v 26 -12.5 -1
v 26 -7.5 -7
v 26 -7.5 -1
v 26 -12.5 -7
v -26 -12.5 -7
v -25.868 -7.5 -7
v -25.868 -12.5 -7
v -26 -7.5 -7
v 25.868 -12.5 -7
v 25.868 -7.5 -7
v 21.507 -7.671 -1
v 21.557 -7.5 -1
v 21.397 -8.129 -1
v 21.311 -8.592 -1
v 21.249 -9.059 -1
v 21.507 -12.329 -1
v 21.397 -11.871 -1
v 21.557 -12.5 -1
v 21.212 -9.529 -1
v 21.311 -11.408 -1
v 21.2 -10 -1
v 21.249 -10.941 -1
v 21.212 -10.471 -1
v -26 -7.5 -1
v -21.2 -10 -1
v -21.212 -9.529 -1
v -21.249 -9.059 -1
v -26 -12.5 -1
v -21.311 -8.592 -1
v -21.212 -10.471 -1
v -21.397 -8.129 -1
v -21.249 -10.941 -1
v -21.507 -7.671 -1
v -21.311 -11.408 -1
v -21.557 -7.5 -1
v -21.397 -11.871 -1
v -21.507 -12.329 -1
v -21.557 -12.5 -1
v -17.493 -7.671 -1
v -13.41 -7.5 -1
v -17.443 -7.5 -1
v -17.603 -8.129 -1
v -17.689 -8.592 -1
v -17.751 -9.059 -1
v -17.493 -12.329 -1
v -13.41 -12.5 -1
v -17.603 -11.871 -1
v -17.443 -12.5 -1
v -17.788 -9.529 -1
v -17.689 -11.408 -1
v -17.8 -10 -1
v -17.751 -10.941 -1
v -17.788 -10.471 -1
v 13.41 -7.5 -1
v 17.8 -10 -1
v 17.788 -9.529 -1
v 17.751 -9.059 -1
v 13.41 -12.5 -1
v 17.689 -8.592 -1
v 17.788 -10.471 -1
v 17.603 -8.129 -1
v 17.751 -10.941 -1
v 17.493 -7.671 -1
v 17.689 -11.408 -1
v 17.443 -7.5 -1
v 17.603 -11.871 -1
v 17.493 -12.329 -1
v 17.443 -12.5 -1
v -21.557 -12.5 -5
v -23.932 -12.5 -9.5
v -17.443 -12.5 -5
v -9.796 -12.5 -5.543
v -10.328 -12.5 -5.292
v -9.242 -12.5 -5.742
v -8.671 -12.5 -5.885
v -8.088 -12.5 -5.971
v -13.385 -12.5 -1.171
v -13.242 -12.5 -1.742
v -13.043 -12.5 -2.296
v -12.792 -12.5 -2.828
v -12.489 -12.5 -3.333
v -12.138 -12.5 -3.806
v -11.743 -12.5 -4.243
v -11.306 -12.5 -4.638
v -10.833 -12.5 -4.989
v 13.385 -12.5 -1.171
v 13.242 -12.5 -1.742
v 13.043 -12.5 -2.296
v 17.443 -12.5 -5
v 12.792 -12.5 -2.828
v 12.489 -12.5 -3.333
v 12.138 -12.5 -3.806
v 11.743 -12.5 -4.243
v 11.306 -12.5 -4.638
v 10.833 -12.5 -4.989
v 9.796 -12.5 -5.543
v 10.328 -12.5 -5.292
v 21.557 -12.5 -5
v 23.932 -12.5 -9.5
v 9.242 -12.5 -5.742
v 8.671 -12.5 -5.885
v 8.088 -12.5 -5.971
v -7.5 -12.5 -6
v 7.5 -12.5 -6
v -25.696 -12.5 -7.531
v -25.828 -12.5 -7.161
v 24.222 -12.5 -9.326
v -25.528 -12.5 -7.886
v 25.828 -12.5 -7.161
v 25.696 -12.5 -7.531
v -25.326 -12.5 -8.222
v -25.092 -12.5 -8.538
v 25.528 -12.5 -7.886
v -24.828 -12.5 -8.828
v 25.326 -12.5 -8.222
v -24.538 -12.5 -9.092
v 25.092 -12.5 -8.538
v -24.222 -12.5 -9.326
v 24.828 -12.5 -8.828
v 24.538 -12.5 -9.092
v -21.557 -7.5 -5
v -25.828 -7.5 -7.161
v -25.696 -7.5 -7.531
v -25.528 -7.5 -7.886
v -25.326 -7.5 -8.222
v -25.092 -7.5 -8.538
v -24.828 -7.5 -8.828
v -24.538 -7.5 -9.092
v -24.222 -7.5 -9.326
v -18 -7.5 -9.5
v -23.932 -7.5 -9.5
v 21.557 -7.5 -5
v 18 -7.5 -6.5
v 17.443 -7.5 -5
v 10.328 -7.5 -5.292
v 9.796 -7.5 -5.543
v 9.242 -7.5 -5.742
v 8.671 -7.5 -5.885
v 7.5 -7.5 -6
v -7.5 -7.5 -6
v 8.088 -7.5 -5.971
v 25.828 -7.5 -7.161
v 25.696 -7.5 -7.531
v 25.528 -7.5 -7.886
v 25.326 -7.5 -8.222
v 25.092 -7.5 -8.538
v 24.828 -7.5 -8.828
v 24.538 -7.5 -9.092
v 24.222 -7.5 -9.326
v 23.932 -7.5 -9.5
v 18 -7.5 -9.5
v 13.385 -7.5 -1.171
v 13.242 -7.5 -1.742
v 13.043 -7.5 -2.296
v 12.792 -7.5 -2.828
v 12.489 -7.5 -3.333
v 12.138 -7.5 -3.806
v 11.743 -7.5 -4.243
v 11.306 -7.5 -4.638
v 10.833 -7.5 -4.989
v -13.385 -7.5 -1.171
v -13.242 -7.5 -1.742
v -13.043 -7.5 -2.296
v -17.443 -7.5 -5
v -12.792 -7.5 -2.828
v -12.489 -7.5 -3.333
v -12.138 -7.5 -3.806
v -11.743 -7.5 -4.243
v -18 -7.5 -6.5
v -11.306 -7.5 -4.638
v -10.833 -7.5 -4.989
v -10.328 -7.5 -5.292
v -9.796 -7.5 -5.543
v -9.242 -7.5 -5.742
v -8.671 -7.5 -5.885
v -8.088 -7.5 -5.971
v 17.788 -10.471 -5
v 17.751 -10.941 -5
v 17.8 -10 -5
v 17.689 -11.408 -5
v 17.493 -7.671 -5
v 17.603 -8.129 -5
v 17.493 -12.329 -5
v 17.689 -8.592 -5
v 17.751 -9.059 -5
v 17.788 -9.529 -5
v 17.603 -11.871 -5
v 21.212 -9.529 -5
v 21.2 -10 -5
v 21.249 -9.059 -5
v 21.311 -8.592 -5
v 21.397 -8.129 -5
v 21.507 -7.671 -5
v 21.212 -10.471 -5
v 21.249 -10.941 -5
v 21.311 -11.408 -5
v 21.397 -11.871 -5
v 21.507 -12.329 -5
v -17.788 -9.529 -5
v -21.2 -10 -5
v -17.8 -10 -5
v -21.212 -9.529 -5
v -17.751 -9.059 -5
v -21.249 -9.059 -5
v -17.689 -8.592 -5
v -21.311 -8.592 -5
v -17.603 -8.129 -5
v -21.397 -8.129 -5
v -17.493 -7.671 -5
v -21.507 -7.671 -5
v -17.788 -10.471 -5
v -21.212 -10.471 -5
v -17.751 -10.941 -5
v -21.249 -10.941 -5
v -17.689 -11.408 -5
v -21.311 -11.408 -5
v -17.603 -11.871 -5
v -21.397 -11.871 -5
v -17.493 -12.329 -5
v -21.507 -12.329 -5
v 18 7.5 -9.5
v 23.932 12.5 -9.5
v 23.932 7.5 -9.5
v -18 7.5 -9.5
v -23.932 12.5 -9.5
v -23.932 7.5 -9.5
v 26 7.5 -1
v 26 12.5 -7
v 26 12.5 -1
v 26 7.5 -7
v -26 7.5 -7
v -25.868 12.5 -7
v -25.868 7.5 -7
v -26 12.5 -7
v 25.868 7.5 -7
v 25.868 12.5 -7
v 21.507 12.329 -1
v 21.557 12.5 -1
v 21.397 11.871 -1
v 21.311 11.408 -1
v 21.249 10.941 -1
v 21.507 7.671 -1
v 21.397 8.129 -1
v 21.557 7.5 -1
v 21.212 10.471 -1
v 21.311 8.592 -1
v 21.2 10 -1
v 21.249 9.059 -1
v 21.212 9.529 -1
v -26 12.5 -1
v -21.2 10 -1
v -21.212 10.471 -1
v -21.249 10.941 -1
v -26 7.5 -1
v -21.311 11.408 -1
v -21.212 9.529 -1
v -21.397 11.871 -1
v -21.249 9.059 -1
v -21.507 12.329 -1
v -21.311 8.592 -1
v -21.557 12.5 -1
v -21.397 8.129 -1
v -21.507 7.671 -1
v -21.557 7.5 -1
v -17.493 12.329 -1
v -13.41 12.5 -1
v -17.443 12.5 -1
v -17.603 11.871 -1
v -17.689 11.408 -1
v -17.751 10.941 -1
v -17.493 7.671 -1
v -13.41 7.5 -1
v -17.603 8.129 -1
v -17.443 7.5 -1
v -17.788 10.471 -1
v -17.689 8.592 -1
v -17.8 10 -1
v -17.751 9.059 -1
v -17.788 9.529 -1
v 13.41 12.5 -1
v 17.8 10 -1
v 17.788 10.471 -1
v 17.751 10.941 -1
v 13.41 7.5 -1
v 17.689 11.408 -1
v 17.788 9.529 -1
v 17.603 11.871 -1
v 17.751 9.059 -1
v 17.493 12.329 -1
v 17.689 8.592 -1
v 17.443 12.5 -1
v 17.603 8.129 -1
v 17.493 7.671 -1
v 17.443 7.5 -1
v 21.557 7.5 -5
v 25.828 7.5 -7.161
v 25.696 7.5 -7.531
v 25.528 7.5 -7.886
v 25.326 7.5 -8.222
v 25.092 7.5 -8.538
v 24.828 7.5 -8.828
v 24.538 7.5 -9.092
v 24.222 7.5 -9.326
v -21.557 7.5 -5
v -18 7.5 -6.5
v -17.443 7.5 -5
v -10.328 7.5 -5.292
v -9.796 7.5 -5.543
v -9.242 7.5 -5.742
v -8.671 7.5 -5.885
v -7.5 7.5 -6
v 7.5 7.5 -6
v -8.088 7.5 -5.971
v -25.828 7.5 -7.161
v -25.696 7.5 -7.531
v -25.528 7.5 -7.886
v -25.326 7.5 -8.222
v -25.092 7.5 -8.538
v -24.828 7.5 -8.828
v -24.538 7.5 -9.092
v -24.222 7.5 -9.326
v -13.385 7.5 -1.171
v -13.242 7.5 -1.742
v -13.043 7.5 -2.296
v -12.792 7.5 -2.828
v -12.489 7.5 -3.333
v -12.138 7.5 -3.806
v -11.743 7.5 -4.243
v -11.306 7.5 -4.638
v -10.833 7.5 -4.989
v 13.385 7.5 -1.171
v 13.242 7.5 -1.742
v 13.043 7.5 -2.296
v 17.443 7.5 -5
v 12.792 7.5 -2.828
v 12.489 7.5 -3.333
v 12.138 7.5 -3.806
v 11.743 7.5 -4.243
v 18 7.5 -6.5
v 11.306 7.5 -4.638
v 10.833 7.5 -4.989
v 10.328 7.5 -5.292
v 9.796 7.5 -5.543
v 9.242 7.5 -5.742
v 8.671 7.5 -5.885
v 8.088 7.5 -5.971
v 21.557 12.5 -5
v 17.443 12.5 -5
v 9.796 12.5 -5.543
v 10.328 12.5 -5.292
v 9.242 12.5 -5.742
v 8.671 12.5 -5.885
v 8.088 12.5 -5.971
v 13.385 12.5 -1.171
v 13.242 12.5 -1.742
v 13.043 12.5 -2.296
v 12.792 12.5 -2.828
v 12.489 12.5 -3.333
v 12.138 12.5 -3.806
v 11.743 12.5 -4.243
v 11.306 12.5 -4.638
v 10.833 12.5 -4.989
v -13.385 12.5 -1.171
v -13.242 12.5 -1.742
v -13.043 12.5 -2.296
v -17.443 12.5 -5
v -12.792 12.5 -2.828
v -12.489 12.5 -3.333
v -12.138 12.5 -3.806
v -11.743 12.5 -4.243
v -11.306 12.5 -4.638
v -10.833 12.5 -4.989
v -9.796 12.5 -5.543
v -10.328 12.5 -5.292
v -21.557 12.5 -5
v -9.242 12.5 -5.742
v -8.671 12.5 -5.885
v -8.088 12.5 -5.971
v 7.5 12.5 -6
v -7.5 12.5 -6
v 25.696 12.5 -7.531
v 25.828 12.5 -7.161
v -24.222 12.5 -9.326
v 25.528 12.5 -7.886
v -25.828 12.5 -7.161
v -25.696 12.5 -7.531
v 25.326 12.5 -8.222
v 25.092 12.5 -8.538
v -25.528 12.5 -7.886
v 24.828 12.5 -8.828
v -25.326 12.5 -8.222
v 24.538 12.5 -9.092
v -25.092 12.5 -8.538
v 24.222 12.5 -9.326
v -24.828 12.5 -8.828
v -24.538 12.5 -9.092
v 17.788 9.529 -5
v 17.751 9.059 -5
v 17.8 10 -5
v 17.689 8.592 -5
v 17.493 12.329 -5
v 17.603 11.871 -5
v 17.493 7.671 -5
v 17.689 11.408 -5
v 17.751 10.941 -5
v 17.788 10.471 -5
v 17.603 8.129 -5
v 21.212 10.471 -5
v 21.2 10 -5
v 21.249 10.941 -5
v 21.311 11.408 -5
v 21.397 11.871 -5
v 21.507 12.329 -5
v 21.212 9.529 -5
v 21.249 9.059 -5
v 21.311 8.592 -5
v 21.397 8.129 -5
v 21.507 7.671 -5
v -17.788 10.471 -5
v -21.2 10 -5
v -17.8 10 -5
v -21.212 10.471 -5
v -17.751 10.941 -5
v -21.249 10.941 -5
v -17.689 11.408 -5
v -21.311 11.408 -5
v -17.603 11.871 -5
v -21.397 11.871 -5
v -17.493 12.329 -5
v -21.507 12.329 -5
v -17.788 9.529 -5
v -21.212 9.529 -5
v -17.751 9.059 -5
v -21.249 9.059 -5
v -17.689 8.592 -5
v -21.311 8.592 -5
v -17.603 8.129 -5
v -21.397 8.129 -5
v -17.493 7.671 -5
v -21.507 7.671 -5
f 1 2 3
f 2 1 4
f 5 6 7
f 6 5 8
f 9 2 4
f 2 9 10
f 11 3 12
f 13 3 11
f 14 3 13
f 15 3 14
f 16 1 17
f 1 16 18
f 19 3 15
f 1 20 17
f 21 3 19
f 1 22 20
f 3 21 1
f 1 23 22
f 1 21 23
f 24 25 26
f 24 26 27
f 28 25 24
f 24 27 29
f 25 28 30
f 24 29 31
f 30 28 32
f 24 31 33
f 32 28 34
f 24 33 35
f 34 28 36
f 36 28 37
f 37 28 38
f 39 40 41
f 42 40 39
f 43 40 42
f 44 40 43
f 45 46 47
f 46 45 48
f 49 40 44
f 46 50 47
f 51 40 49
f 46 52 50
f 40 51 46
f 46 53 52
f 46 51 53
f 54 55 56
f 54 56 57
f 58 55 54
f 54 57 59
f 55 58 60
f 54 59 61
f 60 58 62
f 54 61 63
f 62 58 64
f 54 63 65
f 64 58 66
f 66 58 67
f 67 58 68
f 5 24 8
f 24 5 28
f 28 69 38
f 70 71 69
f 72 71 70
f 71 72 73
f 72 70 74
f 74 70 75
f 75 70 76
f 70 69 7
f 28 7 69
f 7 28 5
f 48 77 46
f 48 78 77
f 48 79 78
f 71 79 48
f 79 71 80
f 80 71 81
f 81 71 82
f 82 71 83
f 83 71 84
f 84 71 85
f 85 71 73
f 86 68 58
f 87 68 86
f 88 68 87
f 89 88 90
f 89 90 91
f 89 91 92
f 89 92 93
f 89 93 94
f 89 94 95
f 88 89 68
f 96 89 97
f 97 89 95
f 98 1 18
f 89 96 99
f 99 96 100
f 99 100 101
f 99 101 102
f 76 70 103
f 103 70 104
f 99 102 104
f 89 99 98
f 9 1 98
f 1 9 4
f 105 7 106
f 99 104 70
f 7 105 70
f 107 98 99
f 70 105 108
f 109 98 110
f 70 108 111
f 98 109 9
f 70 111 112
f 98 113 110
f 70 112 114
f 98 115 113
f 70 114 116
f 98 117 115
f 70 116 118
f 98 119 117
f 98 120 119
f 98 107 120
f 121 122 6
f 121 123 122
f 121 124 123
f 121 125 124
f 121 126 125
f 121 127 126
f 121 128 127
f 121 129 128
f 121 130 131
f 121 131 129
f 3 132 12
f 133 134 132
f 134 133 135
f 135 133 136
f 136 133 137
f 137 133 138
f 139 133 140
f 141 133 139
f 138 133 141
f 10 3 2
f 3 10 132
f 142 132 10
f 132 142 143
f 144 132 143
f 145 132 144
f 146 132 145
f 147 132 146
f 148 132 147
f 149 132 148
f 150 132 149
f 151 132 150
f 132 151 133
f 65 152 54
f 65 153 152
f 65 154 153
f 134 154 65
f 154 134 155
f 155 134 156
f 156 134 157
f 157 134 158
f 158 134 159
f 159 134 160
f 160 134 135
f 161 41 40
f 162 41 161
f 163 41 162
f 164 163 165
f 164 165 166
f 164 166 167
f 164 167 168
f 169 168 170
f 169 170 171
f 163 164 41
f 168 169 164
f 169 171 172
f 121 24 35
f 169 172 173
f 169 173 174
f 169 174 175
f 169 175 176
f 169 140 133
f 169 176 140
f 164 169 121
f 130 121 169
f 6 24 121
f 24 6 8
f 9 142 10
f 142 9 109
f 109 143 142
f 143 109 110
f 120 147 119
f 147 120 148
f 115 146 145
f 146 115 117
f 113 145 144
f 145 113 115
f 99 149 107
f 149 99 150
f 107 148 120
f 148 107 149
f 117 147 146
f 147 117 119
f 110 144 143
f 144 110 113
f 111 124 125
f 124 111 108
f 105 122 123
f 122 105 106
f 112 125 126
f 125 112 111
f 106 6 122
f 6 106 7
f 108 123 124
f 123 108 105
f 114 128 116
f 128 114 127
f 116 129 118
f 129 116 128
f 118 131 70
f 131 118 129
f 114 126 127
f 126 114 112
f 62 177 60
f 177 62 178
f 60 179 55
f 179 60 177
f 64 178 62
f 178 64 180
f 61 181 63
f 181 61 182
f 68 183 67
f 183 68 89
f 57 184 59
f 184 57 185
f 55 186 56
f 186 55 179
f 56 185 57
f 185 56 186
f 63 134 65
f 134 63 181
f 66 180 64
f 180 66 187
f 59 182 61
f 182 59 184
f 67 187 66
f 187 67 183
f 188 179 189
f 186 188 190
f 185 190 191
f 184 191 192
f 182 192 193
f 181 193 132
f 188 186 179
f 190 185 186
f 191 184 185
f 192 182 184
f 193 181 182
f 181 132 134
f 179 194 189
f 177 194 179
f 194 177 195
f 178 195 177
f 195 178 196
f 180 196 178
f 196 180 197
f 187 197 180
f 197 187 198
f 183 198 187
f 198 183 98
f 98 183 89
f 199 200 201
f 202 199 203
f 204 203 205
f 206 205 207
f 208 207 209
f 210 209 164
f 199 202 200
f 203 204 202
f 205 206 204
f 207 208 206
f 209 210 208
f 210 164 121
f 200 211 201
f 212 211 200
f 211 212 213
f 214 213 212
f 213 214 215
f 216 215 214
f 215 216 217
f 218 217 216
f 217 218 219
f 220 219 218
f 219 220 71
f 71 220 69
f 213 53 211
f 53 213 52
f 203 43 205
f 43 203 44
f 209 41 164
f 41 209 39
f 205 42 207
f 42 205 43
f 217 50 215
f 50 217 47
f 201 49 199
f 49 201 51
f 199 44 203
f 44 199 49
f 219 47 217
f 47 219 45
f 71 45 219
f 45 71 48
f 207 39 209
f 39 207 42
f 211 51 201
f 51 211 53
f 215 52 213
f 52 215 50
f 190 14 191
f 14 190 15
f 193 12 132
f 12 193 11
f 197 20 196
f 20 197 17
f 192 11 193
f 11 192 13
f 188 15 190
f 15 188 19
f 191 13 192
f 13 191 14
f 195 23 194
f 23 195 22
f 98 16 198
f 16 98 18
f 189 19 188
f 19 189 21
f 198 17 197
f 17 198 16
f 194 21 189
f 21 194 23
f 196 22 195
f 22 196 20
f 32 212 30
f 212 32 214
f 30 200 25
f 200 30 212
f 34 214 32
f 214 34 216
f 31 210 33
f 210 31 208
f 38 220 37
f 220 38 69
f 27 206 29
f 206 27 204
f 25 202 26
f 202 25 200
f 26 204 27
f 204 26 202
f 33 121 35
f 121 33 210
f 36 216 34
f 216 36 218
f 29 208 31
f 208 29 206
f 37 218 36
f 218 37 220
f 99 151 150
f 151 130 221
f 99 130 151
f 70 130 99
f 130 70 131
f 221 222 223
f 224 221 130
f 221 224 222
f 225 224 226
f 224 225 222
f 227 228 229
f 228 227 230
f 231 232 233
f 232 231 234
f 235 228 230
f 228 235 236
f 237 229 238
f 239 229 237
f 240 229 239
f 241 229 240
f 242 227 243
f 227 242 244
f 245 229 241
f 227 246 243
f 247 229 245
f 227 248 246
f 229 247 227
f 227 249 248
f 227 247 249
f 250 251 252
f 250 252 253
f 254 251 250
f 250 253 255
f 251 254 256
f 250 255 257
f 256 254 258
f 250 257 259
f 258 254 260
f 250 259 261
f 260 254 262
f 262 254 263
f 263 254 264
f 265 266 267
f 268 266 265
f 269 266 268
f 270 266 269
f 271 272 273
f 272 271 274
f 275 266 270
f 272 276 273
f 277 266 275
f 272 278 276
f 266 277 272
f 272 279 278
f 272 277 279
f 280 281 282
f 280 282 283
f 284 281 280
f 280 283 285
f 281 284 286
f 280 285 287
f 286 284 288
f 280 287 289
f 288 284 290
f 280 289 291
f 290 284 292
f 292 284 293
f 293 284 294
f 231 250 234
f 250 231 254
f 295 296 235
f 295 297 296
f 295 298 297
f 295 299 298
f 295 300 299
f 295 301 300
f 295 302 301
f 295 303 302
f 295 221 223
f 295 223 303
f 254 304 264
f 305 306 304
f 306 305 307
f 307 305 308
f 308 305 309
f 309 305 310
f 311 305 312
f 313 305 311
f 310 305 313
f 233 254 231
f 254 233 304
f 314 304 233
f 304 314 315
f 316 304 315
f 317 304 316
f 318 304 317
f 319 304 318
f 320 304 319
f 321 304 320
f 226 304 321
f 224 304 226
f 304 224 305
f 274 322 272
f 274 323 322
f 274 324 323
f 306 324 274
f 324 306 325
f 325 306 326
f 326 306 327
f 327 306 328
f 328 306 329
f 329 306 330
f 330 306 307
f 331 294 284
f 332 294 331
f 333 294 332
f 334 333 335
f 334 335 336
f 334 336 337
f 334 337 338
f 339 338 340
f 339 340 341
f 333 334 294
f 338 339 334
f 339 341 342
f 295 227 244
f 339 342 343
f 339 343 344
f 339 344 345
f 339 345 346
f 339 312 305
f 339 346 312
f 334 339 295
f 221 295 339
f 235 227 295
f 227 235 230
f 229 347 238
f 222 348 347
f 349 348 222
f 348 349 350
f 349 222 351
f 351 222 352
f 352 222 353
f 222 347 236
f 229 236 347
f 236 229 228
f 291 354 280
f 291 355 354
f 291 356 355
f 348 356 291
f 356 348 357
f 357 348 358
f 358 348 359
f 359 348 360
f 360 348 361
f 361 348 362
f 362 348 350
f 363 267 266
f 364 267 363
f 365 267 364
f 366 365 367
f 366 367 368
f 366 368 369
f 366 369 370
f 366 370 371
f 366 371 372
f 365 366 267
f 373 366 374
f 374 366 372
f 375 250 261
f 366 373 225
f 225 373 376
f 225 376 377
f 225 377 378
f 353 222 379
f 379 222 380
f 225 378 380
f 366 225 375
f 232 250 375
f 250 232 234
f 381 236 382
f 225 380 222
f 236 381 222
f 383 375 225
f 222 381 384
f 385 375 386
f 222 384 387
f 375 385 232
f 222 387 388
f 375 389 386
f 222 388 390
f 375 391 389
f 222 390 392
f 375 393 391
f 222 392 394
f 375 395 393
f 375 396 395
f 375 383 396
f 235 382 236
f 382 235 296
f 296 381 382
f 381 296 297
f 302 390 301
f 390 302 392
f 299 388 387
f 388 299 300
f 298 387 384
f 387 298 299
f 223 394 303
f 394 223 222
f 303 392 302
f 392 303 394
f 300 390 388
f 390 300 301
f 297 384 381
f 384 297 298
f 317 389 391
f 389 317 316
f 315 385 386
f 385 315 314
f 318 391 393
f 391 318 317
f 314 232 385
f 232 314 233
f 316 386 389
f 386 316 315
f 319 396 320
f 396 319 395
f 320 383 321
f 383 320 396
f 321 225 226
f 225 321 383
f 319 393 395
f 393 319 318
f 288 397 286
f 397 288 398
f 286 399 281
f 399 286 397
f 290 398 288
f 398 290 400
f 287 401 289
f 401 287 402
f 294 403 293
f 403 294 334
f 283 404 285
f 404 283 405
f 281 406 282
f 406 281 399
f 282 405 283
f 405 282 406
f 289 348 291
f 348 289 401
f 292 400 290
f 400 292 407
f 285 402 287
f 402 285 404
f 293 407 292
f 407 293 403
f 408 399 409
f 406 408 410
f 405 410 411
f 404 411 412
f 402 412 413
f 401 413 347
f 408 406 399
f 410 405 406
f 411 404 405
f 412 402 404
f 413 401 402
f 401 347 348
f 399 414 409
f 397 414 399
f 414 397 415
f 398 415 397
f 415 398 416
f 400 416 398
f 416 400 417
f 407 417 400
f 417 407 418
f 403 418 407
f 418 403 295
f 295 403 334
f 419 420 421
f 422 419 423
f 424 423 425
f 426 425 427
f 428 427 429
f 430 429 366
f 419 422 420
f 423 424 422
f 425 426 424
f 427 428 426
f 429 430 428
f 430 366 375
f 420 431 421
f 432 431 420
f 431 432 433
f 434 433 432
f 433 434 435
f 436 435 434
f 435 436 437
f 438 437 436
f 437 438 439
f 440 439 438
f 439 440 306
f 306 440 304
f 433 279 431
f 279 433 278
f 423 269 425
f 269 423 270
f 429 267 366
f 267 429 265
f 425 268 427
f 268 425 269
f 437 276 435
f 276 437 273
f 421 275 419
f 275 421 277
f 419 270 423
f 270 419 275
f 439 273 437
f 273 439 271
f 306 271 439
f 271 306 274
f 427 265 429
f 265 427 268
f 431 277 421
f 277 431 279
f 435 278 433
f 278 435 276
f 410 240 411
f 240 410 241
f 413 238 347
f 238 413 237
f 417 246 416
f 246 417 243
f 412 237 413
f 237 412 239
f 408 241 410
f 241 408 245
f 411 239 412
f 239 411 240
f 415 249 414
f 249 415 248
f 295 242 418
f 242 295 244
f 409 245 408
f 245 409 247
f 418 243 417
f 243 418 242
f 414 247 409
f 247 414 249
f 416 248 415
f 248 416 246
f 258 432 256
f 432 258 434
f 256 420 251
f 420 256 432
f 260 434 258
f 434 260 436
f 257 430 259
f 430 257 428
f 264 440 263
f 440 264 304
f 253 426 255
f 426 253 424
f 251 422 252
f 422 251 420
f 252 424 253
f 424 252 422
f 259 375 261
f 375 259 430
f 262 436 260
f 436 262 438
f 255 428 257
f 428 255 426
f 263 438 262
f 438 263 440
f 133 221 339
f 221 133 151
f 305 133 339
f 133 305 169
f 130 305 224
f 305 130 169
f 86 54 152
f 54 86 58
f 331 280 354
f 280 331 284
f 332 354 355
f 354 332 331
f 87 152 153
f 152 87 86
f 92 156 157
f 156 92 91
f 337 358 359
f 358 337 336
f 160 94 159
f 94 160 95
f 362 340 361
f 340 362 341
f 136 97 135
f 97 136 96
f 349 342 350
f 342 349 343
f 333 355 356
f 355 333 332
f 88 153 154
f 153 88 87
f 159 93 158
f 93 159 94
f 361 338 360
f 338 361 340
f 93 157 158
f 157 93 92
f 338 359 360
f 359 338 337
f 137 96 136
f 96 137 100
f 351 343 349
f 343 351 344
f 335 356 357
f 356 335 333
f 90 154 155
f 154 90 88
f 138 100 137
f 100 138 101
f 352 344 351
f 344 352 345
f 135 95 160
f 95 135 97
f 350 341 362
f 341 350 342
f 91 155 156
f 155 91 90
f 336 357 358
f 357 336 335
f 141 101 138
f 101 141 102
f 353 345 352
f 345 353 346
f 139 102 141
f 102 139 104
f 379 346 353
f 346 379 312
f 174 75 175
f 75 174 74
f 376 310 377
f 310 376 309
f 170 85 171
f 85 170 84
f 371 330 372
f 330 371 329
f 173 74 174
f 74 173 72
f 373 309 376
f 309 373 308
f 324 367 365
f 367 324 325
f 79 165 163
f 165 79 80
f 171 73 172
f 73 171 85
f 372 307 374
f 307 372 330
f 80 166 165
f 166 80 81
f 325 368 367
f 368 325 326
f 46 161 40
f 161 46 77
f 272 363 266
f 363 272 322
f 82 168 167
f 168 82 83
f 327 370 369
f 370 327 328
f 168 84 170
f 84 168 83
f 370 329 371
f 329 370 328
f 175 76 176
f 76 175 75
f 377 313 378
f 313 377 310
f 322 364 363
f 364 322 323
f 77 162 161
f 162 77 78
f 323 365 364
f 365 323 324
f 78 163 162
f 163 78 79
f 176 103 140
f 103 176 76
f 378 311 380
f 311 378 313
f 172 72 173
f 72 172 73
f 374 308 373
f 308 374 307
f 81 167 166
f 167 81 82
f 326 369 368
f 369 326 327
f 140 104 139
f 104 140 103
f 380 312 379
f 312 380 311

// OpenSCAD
// TrackGauge-WeightDeckv2-Thingiverse.scad
// A gauge for setting railway tracks at a specific gauge with a deck
// to hold weights when setting glues.

// Created by Hamish Trolove - Feb 2019
//www.techmonkeybusiness.com

//Licensed under a Creative Commons license - attribution
// share alike. CC-BY-SA

//No extra libraries are required and it works under 
//      OpenSCAD 2014 and OpenSCAD 2015.


//Track Gauge
TrakGage = 36;

//Rail head width
RailHdWd = 3;

//Full depth of rail
RailHt = 6;

//Allowance for the sleeper attachment details
SlprAttAllow = 1;   
                    
// Top holder bar height
TopBar = 3;

//Holder corner radius
CnrRad = 4;

//Tool size
ToolDepth = 5;

//Tool Length
GageDist = 20;

//Material Spread Allowance
NozAll = 0.2;  // Allowance for spread of material around nozzle during printing


module GageBit()
{
    union()
    {
        translate([0.25*TrakGage-NozAll,0,0.5*(RailHt - SlprAttAllow)]) cylinder(r=0.25*TrakGage, h = RailHt - SlprAttAllow, center = true, $fn = 120);
        translate([-0.25*TrakGage+NozAll,0,0.5*(RailHt - SlprAttAllow)]) cylinder(r=0.25*TrakGage, h = RailHt - SlprAttAllow, center = true, $fn = 120);
        
        translate([0.75*TrakGage+RailHdWd+NozAll,0,0.5*(RailHt - SlprAttAllow)]) cylinder(r=0.25*TrakGage, h = RailHt - SlprAttAllow, center = true, $fn = 120);
        translate([-0.75*TrakGage-RailHdWd-NozAll,0,0.5*(RailHt - SlprAttAllow)]) cylinder(r=0.25*TrakGage, h = RailHt - SlprAttAllow, center = true, $fn = 120);
    }
}

module TopCap()
{
    //Top cap
    translate([0,0,RailHt - SlprAttAllow+0.75*TopBar])cube([(RailHdWd+TrakGage+0.2)*2,TrakGage,TopBar*1.5], center = true);
}

//Trimmer
module Trimmer()
{
    
    translate([0,0,0.5*(RailHt - SlprAttAllow+TopBar)])cube([TrakGage+4*CnrRad,ToolDepth,TopBar+RailHt-SlprAttAllow-0.5*CnrRad], center = true);
    translate([0.5*TrakGage+CnrRad,0,RailHt - SlprAttAllow+TopBar-0.5*CnrRad]) rotate([90,0,0]) cylinder(r = CnrRad, h = ToolDepth, center = true, $fn = 64);
     translate([-0.5*TrakGage-CnrRad,0,RailHt - SlprAttAllow+TopBar-0.5*CnrRad]) rotate([90,0,0]) cylinder(r = CnrRad, h = ToolDepth, center = true, $fn = 64);
    translate([0,0,0.5*(RailHt - SlprAttAllow)+TopBar+0.625*CnrRad])cube([TrakGage+CnrRad*2,ToolDepth,CnrRad], center = true);
}

//Cutouts
module Cutouts()
{
    union()
    {
        translate([0.25*(TrakGage-RailHt),0,0]) rotate([90,0,0])cylinder(r = RailHt, h = GageDist*1.5, center = true, $fn=64);
        translate([-0.25*(TrakGage-RailHt),0,0]) rotate([90,0,0])cylinder(r = RailHt, h = GageDist*1.5, center = true, $fn=64);
        cube([0.5*(TrakGage-RailHt),GageDist*1.5,2*RailHt],center = true);

    }
}

module WeightPlate()
{
    translate([0,0,RailHt - SlprAttAllow+TopBar])cube([TrakGage,GageDist,TopBar], center = true);
}



rotate([180,0,0]) difference()
{
    union()
    {
        translate([0,0.5*GageDist,0]) intersection()
        {
            Trimmer();
            union()
            {
                GageBit();
                TopCap();
            }
        }
       
        translate([0,-0.5*GageDist,0]) intersection()
        {
            Trimmer();
            union()
            {
                GageBit();
                TopCap();
            }
        }
        WeightPlate();
    }
    
    Cutouts();
}
